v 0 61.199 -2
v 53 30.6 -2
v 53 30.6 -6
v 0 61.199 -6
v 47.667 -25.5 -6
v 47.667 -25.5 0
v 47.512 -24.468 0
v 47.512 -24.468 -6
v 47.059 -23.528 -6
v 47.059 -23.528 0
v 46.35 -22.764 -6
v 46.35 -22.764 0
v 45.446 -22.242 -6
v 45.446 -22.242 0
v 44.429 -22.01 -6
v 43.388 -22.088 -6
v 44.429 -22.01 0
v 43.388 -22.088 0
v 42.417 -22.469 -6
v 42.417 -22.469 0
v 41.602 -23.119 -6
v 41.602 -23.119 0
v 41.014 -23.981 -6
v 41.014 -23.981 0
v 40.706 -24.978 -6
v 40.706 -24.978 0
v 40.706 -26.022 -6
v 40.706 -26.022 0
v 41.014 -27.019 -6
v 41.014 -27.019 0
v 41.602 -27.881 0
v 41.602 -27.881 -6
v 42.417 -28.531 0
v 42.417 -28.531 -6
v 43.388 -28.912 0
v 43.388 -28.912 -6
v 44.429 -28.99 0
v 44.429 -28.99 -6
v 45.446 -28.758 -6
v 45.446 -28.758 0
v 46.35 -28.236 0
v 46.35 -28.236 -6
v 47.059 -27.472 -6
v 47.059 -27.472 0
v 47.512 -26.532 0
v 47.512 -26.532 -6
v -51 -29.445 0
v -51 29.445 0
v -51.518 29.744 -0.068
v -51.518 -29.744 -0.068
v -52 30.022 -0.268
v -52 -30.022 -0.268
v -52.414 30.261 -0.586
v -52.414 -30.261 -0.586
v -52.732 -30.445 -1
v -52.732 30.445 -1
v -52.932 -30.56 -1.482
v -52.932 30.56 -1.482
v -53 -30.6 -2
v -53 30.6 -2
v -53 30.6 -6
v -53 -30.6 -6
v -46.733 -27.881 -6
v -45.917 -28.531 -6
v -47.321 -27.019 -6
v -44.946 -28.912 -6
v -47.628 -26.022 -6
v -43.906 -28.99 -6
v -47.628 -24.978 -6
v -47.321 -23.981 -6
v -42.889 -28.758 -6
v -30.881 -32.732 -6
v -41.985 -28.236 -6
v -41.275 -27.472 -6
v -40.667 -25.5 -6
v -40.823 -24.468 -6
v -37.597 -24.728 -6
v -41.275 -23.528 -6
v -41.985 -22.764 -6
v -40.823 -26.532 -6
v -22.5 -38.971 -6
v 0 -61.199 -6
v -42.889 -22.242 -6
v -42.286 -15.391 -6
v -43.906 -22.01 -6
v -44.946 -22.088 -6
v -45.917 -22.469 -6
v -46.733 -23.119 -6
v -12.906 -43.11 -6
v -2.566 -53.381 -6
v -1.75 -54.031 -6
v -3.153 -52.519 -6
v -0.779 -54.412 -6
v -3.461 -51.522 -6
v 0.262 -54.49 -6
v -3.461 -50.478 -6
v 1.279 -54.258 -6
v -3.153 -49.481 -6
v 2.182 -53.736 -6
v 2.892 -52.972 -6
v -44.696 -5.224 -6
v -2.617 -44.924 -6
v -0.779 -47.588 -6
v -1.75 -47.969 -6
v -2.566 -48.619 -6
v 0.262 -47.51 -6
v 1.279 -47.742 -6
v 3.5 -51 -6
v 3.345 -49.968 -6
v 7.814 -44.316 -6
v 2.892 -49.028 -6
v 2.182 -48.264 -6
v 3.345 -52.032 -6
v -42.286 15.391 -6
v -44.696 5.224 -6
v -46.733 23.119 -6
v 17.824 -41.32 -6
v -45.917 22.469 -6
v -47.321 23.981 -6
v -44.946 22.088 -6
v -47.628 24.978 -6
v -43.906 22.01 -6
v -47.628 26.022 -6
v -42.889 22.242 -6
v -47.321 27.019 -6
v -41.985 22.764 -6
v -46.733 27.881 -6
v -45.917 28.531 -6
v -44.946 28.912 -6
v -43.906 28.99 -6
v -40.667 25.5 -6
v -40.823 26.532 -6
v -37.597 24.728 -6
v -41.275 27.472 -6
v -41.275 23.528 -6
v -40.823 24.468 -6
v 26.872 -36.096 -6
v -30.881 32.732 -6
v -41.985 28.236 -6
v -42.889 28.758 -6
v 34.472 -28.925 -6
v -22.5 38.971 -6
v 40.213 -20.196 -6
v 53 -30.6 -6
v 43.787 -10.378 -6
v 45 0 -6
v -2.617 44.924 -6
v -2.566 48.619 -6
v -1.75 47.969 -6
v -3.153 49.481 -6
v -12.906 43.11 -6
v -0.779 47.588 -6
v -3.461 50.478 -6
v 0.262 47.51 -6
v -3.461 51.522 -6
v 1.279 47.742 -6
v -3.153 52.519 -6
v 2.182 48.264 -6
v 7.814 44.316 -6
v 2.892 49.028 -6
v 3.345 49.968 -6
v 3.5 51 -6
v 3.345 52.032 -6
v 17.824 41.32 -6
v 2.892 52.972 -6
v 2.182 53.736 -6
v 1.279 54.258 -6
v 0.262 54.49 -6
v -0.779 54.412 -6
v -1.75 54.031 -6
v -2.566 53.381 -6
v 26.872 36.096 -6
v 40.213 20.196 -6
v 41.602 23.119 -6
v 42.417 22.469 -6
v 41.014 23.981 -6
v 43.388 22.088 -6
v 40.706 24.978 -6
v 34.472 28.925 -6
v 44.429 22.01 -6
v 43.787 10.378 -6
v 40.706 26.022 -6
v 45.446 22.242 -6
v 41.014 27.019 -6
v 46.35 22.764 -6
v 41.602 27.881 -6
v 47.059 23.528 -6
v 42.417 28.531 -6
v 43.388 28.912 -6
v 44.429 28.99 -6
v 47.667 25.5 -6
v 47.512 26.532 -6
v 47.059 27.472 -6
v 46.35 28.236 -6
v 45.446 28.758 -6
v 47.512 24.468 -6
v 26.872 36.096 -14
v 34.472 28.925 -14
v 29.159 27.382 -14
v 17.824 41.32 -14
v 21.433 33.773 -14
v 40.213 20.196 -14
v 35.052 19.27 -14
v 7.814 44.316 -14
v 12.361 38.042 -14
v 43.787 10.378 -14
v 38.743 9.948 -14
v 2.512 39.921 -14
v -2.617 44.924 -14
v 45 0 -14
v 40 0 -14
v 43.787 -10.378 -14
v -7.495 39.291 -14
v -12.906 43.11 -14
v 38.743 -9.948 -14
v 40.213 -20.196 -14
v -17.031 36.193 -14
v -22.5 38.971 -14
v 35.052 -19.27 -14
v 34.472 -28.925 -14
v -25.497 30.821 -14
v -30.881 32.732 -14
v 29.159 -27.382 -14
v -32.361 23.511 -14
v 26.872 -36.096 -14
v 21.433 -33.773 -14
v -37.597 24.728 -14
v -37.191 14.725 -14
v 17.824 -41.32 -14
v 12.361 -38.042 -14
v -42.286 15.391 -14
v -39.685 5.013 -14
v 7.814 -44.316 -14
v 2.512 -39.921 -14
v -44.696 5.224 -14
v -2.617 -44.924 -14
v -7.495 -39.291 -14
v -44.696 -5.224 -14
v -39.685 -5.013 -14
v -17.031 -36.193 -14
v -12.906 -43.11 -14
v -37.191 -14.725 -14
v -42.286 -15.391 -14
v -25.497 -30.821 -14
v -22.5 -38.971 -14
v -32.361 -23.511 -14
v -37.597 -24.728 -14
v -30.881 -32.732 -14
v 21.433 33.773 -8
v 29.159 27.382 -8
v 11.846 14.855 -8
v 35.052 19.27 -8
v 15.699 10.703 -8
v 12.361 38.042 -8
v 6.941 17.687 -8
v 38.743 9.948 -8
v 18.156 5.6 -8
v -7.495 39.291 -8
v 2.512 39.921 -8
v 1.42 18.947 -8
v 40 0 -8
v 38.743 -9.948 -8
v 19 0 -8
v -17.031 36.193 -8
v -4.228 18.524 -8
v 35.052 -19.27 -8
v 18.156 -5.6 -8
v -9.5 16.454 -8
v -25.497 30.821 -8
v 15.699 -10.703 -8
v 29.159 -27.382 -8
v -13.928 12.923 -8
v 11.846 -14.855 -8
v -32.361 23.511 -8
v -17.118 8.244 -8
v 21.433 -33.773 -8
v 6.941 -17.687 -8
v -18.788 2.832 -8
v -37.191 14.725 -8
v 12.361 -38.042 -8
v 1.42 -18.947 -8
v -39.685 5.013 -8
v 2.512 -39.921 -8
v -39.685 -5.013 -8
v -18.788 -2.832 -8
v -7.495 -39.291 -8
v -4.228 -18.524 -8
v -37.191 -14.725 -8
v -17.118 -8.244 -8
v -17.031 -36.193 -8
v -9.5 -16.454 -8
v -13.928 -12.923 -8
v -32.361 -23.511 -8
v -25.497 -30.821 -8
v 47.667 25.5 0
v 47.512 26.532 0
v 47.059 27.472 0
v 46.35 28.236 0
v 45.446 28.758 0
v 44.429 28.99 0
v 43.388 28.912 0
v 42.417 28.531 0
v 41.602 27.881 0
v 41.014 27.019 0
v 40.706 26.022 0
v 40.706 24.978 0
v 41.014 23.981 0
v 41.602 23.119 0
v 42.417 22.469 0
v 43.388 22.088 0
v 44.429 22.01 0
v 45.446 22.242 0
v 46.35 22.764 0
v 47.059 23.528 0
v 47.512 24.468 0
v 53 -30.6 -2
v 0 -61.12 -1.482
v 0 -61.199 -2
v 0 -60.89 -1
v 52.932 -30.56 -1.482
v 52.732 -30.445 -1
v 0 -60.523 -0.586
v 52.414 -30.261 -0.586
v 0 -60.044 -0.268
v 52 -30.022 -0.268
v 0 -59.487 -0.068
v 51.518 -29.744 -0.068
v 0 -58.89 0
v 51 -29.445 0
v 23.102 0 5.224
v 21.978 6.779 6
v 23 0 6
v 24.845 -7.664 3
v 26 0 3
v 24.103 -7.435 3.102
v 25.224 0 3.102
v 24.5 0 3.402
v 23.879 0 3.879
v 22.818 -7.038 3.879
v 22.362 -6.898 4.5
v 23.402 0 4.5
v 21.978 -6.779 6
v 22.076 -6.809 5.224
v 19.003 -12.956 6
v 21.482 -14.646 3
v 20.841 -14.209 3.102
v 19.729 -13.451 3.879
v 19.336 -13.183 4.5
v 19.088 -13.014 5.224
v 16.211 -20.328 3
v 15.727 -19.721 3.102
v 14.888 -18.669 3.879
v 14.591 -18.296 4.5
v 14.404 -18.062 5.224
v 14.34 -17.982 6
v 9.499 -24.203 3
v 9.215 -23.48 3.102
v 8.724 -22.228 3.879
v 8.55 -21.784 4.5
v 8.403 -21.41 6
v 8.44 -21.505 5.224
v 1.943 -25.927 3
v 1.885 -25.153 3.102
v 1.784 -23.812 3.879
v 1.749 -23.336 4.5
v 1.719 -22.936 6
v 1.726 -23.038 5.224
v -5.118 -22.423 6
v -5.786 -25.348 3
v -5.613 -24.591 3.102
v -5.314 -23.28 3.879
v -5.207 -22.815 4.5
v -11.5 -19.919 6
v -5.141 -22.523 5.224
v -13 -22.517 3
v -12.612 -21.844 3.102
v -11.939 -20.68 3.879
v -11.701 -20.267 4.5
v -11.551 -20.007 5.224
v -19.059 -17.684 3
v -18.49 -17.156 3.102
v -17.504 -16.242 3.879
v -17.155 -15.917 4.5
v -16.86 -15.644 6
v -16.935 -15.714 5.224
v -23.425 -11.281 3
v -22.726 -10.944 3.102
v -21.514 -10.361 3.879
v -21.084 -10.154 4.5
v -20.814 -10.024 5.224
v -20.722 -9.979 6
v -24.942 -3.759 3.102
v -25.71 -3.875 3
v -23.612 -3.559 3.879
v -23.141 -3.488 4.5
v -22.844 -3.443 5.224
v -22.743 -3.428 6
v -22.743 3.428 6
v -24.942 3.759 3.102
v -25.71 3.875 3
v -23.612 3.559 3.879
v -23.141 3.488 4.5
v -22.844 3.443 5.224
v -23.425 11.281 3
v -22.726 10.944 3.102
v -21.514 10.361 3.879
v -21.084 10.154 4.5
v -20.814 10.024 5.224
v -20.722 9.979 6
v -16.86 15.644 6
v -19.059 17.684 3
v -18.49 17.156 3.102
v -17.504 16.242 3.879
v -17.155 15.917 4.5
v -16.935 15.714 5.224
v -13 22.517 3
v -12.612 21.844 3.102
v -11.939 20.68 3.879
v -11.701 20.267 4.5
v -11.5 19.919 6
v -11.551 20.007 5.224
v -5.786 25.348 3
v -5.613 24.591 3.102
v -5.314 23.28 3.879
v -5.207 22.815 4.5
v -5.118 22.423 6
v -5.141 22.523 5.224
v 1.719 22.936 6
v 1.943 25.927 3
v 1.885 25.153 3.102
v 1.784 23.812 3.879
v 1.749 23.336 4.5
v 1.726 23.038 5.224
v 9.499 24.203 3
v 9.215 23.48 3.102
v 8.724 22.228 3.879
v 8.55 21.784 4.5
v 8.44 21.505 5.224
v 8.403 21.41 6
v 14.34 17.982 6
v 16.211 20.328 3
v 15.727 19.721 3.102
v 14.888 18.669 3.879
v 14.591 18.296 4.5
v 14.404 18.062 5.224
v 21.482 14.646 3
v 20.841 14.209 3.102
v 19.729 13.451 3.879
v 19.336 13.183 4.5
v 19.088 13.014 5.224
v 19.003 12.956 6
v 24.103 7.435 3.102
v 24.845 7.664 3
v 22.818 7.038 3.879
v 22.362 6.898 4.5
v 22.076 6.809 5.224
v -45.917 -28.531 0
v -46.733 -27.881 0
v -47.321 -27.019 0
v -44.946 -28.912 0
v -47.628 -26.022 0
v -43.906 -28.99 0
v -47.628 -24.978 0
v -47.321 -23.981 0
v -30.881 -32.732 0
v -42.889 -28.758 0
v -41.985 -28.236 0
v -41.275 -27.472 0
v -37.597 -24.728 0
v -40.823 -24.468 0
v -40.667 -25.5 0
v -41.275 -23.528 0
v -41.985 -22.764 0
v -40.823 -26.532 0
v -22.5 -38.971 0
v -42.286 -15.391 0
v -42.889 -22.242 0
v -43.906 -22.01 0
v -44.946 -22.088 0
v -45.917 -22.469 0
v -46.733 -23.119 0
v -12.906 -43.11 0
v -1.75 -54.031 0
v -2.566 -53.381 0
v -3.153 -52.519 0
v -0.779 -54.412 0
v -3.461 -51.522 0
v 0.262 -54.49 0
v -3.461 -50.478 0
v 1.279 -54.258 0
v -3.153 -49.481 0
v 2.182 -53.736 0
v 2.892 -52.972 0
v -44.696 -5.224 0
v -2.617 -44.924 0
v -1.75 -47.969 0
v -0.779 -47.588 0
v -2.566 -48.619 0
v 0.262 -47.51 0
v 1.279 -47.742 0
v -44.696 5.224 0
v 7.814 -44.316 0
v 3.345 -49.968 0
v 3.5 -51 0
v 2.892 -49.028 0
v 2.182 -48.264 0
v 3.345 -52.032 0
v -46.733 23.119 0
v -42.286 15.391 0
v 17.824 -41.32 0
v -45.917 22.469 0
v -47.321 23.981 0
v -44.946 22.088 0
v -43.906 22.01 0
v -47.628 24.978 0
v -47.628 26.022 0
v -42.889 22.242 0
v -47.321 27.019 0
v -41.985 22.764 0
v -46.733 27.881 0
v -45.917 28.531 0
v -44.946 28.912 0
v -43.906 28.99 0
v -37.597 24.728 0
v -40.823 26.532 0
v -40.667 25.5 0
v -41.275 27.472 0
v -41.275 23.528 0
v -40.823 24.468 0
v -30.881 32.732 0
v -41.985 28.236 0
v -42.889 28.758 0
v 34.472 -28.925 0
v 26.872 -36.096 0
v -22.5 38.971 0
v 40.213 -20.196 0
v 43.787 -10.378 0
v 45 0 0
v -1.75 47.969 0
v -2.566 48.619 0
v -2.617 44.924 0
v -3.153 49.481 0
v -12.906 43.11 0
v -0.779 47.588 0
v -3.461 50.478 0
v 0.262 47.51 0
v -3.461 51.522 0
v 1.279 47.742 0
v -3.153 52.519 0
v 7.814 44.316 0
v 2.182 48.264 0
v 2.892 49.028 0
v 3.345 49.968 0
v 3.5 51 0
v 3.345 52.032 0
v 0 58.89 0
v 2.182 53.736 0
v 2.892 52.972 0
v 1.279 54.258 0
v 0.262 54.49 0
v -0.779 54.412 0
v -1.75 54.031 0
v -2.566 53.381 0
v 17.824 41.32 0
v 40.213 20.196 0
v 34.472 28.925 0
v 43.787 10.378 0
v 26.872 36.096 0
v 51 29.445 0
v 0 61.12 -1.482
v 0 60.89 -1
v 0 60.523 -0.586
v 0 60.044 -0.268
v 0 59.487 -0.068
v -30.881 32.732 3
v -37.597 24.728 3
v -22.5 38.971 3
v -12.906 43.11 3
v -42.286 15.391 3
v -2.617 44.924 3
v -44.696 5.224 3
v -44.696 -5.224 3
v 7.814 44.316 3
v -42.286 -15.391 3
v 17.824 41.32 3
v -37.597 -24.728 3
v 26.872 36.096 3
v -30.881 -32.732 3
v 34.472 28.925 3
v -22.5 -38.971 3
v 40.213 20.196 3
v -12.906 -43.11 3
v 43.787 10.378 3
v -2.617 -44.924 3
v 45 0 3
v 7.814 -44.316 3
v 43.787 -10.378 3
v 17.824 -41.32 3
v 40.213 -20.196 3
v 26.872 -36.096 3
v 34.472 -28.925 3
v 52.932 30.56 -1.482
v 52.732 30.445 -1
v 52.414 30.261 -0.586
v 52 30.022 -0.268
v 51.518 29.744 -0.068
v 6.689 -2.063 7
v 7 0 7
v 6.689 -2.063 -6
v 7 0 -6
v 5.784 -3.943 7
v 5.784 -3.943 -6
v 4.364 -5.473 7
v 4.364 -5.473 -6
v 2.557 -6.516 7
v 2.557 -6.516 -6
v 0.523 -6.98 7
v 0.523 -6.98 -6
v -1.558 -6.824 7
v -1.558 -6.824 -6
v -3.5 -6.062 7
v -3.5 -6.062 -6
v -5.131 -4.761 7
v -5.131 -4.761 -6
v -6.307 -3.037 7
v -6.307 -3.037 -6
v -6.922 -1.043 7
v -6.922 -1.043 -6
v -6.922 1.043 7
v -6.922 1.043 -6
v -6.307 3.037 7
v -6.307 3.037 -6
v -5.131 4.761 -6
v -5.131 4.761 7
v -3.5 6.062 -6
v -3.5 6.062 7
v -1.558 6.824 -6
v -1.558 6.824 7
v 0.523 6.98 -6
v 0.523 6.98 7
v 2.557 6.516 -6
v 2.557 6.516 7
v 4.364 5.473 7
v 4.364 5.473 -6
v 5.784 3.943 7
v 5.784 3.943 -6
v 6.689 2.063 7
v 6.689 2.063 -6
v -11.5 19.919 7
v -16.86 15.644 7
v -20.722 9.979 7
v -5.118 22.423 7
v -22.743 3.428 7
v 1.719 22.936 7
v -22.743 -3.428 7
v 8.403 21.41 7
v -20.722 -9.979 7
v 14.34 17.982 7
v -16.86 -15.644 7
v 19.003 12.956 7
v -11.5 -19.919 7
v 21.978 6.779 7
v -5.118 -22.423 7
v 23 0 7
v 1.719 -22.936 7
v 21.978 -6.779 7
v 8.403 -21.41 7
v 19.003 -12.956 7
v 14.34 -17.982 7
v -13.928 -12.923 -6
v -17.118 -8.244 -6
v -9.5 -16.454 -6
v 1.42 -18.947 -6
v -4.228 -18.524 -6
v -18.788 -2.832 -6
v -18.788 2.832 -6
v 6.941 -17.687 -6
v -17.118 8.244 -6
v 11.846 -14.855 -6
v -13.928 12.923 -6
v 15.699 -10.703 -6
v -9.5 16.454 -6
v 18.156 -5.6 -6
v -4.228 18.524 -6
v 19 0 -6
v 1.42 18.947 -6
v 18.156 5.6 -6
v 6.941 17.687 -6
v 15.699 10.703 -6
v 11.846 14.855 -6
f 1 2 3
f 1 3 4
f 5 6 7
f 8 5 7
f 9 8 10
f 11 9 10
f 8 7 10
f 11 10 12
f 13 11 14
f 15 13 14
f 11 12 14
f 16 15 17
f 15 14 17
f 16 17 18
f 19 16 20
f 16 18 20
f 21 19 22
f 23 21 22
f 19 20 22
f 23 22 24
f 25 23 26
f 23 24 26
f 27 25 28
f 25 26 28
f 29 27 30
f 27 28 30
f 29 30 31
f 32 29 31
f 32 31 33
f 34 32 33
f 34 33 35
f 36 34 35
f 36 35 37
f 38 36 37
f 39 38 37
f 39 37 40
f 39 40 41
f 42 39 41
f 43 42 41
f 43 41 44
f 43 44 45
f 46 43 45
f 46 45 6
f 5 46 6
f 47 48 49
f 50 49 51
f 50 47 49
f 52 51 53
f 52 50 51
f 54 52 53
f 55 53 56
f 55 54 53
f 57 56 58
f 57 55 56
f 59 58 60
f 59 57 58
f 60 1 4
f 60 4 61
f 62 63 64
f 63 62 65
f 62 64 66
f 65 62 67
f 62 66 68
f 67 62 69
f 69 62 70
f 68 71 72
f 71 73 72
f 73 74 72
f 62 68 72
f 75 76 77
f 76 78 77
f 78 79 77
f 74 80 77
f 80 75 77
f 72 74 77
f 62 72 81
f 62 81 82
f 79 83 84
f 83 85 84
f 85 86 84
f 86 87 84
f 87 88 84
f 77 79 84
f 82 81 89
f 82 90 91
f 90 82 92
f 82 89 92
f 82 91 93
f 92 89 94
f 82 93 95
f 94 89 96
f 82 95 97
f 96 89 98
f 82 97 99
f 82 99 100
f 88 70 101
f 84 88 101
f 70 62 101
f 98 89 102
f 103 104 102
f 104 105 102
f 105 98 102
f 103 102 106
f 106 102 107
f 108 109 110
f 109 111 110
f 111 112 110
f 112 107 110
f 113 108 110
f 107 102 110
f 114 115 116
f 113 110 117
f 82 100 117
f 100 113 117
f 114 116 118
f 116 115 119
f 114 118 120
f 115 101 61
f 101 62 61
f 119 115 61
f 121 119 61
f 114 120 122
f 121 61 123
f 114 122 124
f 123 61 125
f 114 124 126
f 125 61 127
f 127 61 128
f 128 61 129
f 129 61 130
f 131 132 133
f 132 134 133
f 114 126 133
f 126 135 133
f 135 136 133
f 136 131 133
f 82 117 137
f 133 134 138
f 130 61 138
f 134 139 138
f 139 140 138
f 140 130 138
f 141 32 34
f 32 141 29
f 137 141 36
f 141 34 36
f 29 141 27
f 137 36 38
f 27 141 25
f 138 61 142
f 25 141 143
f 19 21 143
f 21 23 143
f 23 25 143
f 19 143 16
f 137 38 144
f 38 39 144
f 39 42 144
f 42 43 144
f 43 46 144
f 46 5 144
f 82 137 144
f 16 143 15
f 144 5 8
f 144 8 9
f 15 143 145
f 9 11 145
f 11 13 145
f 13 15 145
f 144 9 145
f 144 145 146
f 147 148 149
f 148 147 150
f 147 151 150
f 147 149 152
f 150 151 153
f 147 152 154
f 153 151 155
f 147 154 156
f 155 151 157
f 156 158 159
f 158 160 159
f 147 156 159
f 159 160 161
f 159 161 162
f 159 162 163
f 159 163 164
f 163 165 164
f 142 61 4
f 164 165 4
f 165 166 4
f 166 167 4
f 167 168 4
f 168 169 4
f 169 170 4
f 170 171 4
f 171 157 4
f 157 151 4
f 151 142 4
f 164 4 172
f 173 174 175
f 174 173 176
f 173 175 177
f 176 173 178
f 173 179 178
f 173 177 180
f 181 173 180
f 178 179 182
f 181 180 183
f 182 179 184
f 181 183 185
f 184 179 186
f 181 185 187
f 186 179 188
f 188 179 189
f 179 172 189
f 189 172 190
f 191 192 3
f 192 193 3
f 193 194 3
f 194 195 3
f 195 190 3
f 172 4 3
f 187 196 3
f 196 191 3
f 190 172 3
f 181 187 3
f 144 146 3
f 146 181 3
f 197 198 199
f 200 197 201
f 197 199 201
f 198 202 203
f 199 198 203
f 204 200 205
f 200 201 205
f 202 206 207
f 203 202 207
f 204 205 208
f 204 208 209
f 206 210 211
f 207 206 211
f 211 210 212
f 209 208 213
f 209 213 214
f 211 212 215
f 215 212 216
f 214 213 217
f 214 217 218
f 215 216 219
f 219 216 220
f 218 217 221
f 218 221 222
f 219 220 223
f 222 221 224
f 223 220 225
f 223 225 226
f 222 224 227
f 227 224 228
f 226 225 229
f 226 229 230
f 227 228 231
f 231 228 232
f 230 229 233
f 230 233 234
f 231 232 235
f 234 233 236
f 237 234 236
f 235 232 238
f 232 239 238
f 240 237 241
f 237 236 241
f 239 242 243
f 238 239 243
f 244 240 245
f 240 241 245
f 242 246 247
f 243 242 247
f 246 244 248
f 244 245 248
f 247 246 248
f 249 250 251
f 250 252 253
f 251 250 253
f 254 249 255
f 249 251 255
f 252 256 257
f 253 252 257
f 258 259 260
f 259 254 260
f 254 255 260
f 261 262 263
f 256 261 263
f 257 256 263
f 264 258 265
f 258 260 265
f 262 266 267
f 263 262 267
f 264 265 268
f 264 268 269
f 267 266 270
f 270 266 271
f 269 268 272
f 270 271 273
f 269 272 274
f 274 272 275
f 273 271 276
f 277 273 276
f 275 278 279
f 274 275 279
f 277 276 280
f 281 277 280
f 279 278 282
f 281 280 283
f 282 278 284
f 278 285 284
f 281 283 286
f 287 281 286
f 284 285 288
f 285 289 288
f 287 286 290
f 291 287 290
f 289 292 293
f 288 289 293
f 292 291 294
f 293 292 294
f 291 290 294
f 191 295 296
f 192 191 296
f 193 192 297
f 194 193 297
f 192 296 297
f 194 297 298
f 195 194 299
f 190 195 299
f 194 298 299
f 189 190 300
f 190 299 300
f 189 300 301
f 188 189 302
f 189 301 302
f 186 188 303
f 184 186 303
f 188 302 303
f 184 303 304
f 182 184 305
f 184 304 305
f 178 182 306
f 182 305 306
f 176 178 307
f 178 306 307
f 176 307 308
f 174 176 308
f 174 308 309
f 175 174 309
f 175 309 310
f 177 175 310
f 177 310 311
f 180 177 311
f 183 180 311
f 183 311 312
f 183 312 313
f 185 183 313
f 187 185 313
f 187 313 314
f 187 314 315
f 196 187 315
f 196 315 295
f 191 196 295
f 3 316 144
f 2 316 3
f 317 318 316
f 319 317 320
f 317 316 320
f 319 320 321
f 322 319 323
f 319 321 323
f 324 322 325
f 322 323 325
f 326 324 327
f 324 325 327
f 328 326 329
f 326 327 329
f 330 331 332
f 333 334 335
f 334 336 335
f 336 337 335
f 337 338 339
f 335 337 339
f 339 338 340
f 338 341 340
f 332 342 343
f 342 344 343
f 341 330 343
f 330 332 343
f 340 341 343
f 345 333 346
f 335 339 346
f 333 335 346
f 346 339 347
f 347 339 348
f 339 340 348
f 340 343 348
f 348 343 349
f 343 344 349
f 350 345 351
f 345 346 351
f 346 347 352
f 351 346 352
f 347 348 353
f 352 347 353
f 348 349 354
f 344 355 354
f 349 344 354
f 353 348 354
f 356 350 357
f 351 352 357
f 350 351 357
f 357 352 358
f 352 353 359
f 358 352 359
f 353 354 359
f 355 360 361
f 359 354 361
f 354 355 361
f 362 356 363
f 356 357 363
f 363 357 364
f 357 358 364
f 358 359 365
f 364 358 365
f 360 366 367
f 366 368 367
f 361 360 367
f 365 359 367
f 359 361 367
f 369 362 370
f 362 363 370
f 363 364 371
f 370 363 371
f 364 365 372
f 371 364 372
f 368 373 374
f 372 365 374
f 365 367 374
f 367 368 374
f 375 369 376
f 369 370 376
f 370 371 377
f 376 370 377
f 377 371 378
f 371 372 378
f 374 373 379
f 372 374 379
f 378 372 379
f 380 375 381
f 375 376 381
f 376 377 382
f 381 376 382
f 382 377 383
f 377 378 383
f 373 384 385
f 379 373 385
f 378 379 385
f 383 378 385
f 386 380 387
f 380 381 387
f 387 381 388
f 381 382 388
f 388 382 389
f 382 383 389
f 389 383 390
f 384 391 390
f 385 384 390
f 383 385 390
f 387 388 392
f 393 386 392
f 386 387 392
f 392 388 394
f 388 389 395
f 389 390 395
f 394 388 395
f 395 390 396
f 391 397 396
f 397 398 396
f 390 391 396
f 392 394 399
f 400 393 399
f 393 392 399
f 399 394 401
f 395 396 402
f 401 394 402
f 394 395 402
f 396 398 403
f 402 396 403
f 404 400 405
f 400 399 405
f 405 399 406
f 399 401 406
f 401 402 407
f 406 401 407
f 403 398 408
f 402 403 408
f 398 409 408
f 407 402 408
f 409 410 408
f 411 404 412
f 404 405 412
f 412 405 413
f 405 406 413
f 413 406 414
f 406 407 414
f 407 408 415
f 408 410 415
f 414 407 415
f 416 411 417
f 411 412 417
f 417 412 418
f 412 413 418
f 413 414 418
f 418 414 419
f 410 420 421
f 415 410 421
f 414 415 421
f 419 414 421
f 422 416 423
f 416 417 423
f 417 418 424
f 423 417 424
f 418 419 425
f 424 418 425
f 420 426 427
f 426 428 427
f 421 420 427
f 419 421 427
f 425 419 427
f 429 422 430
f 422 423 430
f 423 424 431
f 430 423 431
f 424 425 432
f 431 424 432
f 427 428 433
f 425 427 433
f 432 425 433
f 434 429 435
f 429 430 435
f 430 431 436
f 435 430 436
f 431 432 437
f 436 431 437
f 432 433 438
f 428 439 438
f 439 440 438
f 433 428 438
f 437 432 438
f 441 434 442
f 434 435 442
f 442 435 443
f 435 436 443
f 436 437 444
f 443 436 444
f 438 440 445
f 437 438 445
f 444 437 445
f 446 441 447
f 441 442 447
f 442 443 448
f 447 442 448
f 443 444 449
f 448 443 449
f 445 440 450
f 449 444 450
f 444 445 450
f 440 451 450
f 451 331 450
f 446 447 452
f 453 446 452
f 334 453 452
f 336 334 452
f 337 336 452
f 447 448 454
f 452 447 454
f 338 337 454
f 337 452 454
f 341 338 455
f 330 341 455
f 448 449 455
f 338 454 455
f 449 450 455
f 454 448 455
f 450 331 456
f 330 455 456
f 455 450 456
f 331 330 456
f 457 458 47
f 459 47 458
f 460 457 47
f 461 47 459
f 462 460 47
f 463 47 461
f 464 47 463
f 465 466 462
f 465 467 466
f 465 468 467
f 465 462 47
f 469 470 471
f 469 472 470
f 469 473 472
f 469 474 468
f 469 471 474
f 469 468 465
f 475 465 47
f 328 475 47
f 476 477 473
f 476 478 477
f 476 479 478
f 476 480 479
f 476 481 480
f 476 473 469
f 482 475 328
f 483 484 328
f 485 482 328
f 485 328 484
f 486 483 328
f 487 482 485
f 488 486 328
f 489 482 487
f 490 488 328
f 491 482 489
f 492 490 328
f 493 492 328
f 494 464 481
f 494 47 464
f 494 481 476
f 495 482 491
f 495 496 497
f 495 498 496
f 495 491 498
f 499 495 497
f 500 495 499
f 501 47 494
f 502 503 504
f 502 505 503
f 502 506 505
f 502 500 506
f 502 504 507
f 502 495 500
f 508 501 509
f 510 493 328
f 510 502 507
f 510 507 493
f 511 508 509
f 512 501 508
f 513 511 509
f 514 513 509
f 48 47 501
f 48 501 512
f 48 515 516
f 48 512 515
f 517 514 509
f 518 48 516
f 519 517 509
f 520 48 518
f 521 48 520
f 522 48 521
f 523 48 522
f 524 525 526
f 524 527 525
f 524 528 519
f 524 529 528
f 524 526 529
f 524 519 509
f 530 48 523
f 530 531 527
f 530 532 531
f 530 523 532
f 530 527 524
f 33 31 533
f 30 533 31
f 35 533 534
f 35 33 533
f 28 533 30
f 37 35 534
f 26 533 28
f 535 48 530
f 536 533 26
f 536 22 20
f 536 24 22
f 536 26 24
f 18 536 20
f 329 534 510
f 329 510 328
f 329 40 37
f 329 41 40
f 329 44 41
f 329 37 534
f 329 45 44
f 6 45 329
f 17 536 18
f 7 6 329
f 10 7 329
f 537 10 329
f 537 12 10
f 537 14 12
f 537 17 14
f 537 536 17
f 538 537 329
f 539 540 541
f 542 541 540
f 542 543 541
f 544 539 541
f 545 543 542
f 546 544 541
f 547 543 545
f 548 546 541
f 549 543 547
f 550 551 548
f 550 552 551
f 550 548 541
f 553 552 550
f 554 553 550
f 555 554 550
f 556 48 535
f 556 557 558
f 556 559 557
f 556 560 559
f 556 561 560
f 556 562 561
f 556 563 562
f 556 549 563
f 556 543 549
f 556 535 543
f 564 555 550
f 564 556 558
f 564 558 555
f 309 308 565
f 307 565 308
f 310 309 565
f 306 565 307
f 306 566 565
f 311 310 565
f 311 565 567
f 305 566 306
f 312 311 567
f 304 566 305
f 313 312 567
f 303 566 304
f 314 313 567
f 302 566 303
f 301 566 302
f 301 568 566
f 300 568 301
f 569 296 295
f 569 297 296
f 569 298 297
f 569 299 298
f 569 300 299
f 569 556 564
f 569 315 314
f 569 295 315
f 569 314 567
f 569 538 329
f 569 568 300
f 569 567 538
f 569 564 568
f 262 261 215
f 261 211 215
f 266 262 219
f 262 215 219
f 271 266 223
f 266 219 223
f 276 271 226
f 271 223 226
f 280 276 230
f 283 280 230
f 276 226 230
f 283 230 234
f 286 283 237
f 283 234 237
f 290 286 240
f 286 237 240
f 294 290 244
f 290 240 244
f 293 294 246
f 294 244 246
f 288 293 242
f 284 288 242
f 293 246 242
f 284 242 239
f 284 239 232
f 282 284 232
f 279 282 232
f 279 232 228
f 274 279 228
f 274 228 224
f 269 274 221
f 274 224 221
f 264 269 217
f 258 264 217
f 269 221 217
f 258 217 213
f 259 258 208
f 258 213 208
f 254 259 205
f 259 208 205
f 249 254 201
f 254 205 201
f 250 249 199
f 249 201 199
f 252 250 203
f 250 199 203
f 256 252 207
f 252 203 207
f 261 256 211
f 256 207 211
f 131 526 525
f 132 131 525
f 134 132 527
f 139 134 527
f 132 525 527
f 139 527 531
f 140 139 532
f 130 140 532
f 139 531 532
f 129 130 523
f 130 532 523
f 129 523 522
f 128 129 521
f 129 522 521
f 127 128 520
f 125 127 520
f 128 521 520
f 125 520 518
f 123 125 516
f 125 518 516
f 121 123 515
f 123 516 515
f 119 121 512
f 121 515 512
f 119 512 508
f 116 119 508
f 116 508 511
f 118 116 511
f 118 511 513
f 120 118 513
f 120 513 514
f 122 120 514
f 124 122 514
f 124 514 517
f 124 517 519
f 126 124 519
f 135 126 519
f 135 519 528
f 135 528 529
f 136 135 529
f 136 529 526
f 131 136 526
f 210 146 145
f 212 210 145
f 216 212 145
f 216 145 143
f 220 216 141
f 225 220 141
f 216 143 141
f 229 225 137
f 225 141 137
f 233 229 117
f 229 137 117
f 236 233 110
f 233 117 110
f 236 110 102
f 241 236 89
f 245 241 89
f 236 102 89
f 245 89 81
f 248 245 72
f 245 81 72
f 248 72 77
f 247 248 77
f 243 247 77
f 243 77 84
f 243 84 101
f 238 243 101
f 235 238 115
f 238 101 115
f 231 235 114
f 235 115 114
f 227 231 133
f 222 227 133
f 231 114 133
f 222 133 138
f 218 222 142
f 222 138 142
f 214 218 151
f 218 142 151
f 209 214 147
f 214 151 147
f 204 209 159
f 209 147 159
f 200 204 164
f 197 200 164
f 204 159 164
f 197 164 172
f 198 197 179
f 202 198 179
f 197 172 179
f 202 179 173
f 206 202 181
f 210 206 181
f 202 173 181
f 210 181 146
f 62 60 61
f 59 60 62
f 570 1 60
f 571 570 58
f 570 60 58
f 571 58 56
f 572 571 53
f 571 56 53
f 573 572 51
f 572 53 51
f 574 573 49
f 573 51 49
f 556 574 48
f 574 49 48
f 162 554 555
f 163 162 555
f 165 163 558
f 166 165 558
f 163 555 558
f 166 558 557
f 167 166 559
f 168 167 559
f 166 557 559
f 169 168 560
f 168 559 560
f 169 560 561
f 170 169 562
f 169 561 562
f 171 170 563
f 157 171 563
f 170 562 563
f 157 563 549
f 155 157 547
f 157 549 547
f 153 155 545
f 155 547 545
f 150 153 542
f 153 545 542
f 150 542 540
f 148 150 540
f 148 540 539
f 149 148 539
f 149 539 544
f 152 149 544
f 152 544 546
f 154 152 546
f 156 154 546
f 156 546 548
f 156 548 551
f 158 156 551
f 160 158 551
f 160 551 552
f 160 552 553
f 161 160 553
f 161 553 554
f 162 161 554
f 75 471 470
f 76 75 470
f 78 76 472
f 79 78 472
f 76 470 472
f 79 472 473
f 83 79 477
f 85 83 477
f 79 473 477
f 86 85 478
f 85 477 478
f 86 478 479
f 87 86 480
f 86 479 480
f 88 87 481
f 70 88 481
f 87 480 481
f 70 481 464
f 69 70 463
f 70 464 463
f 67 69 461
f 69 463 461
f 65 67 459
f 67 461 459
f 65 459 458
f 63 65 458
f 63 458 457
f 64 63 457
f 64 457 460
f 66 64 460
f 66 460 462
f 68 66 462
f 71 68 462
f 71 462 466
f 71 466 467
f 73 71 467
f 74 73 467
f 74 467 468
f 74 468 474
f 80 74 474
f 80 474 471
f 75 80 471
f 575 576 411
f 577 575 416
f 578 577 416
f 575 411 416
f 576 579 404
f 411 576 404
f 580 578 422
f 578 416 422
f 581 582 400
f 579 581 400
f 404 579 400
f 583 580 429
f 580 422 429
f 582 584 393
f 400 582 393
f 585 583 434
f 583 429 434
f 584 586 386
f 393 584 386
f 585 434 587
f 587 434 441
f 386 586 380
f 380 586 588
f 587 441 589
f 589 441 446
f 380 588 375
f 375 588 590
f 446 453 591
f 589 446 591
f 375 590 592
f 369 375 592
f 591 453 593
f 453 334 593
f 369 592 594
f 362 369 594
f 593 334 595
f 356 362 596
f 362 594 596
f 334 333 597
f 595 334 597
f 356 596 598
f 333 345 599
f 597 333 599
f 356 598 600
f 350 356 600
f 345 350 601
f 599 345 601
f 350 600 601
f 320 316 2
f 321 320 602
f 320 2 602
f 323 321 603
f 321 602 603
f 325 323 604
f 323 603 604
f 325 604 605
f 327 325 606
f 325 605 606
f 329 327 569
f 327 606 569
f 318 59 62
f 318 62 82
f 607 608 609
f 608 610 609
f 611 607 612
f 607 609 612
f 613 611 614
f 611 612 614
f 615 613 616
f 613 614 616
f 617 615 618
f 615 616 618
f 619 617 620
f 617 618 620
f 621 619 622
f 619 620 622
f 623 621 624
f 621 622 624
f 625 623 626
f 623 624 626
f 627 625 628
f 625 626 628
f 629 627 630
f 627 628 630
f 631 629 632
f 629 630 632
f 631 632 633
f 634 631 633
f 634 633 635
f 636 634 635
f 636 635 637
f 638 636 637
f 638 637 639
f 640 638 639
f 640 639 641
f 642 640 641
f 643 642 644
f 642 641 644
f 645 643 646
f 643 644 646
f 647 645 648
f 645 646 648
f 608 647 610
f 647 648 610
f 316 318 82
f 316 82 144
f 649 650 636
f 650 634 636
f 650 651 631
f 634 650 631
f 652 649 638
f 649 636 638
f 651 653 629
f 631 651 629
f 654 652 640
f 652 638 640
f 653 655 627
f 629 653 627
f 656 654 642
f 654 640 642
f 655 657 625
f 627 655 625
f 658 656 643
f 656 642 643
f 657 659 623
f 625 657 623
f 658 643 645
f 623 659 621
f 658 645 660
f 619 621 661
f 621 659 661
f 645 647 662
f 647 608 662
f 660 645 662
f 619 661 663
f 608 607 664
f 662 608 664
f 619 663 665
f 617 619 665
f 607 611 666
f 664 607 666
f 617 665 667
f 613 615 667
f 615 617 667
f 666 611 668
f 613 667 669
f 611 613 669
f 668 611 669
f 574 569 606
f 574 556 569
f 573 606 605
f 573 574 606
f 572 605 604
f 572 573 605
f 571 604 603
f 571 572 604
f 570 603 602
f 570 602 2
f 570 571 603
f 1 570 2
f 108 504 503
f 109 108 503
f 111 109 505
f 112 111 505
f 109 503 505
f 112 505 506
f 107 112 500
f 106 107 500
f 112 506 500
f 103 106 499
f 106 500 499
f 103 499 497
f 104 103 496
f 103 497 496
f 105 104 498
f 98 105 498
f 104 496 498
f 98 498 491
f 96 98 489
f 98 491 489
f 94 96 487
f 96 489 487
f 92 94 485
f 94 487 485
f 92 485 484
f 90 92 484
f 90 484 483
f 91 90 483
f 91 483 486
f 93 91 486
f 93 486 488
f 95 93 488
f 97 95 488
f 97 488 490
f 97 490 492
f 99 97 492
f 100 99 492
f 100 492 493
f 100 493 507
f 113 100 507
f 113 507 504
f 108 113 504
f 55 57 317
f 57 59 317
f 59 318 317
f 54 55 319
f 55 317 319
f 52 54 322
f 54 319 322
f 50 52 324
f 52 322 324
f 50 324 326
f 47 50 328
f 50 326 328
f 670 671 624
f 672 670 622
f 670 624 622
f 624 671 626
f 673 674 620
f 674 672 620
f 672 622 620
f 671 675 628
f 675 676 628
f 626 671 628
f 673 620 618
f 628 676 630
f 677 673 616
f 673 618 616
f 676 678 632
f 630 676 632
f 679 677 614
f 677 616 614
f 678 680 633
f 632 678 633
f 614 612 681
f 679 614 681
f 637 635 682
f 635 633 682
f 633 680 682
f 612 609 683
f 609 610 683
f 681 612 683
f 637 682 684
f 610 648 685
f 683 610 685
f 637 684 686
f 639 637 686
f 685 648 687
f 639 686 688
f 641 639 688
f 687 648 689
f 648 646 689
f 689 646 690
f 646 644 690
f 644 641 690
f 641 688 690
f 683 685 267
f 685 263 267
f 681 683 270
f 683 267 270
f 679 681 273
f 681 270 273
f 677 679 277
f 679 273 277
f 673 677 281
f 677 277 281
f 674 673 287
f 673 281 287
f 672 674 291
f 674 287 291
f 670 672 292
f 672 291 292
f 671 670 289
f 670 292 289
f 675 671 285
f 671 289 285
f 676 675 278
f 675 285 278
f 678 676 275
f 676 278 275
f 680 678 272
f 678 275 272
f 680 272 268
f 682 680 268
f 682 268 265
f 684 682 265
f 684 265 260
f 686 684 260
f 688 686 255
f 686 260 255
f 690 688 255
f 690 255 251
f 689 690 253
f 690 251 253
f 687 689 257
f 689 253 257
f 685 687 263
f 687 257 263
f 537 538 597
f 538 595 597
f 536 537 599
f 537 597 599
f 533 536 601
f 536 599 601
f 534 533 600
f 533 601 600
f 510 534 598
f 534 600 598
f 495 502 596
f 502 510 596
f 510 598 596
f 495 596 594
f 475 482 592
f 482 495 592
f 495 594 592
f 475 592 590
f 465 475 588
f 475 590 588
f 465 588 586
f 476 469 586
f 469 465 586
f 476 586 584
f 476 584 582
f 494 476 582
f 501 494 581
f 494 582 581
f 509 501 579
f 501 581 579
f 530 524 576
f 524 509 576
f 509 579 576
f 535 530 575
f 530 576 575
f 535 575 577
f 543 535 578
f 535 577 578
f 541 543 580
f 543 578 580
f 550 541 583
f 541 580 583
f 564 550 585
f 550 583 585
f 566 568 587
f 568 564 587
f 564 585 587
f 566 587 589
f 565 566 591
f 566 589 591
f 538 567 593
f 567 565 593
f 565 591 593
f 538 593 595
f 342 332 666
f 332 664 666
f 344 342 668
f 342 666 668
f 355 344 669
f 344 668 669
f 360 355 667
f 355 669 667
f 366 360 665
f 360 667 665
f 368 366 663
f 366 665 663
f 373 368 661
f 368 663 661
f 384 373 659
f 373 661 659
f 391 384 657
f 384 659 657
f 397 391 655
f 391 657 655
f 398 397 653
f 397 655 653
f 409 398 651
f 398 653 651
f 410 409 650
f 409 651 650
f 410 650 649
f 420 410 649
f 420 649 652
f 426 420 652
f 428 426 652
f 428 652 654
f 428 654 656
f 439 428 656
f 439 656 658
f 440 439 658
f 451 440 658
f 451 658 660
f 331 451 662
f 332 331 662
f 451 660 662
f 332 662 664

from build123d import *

# Parameters (mm, degrees)
BOSS_EXTRUDE1_DEPTH = 6
SKETCH3_R           = 3.5
SKETCH3_R_2         = 7
CUT_EXTRUDE1_DEPTH  = 83.160412203
FILLET1_R           = 2


with BuildPart() as part:
    # Sketch1 → Revolve1 (revolve)
    with BuildSketch(Plane(origin=(0, 0, 0), x_dir=(0, 0, -1), z_dir=(1, 0, 0)), mode=Mode.PRIVATE) as revolve1_sk:
        with BuildLine():
            Line((-3, 45), (-3, 26))
            ThreePointArc((-3, 26), (-3.878679656, 23.878679656), (-6, 23))
            Line((-6, 23), (-7, 23))
            Line((-7, 23), (-7, 7))
            Line((-7, 7), (0, 7))
            Line((0, 7), (0, 19))
            Line((0, 19), (8, 19))
            Line((8, 19), (8, 40))
            Line((8, 40), (14, 40))
            Line((14, 40), (14, 45))
            Line((14, 45), (3, 45))
            Line((3, 45), (-3, 45))
        make_face()
    revolve(revolve1_sk.sketch.rotate(Axis((0, 0, 21.063158719), (0, 0, -1)), 90), axis=Axis((0, 0, 21.063158719), (0, 0, -1)))

    # Sketch2 → Boss-Extrude1 (add)
    with BuildSketch(Plane.XY):
        Polygon((0, 61.199128534), (-53, 30.599564267), (-53, -30.599564267), (0, -61.199128534), (53, -30.599564267), (53, 30.599564267), align=None)
    extrude(amount=-BOSS_EXTRUDE1_DEPTH)

    # Sketch3 → Cut-Extrude1 (cut, through all)
    with BuildSketch(Plane.XY):
        with Locations((0, 51)):
            Circle(SKETCH3_R)
        with Locations((44.167295593, 25.5)):
            Circle(SKETCH3_R)
        with Locations((44.167295593, -25.5)):
            Circle(SKETCH3_R)
        with Locations((0, -51)):
            Circle(SKETCH3_R)
        with Locations((-44.167295593, -25.5)):
            Circle(SKETCH3_R)
        with Locations((-44.167295593, 25.5)):
            Circle(SKETCH3_R)
        Circle(SKETCH3_R_2)
    extrude(amount=-CUT_EXTRUDE1_DEPTH, mode=Mode.SUBTRACT)

    # Fillet1
    fillet1_edges = [part.edges().sort_by_distance(p)[0] for p in [
        (26.5, 45.899346401, 0),
        (-26.5, 45.899346401, 0),
        (-53, 0, 0),
        (-26.5, -45.899346401, 0),
        (26.5, -45.899346401, 0),
        (53, 0, 0),
    ]]
    fillet(fillet1_edges, radius=FILLET1_R)


solid = part.part
